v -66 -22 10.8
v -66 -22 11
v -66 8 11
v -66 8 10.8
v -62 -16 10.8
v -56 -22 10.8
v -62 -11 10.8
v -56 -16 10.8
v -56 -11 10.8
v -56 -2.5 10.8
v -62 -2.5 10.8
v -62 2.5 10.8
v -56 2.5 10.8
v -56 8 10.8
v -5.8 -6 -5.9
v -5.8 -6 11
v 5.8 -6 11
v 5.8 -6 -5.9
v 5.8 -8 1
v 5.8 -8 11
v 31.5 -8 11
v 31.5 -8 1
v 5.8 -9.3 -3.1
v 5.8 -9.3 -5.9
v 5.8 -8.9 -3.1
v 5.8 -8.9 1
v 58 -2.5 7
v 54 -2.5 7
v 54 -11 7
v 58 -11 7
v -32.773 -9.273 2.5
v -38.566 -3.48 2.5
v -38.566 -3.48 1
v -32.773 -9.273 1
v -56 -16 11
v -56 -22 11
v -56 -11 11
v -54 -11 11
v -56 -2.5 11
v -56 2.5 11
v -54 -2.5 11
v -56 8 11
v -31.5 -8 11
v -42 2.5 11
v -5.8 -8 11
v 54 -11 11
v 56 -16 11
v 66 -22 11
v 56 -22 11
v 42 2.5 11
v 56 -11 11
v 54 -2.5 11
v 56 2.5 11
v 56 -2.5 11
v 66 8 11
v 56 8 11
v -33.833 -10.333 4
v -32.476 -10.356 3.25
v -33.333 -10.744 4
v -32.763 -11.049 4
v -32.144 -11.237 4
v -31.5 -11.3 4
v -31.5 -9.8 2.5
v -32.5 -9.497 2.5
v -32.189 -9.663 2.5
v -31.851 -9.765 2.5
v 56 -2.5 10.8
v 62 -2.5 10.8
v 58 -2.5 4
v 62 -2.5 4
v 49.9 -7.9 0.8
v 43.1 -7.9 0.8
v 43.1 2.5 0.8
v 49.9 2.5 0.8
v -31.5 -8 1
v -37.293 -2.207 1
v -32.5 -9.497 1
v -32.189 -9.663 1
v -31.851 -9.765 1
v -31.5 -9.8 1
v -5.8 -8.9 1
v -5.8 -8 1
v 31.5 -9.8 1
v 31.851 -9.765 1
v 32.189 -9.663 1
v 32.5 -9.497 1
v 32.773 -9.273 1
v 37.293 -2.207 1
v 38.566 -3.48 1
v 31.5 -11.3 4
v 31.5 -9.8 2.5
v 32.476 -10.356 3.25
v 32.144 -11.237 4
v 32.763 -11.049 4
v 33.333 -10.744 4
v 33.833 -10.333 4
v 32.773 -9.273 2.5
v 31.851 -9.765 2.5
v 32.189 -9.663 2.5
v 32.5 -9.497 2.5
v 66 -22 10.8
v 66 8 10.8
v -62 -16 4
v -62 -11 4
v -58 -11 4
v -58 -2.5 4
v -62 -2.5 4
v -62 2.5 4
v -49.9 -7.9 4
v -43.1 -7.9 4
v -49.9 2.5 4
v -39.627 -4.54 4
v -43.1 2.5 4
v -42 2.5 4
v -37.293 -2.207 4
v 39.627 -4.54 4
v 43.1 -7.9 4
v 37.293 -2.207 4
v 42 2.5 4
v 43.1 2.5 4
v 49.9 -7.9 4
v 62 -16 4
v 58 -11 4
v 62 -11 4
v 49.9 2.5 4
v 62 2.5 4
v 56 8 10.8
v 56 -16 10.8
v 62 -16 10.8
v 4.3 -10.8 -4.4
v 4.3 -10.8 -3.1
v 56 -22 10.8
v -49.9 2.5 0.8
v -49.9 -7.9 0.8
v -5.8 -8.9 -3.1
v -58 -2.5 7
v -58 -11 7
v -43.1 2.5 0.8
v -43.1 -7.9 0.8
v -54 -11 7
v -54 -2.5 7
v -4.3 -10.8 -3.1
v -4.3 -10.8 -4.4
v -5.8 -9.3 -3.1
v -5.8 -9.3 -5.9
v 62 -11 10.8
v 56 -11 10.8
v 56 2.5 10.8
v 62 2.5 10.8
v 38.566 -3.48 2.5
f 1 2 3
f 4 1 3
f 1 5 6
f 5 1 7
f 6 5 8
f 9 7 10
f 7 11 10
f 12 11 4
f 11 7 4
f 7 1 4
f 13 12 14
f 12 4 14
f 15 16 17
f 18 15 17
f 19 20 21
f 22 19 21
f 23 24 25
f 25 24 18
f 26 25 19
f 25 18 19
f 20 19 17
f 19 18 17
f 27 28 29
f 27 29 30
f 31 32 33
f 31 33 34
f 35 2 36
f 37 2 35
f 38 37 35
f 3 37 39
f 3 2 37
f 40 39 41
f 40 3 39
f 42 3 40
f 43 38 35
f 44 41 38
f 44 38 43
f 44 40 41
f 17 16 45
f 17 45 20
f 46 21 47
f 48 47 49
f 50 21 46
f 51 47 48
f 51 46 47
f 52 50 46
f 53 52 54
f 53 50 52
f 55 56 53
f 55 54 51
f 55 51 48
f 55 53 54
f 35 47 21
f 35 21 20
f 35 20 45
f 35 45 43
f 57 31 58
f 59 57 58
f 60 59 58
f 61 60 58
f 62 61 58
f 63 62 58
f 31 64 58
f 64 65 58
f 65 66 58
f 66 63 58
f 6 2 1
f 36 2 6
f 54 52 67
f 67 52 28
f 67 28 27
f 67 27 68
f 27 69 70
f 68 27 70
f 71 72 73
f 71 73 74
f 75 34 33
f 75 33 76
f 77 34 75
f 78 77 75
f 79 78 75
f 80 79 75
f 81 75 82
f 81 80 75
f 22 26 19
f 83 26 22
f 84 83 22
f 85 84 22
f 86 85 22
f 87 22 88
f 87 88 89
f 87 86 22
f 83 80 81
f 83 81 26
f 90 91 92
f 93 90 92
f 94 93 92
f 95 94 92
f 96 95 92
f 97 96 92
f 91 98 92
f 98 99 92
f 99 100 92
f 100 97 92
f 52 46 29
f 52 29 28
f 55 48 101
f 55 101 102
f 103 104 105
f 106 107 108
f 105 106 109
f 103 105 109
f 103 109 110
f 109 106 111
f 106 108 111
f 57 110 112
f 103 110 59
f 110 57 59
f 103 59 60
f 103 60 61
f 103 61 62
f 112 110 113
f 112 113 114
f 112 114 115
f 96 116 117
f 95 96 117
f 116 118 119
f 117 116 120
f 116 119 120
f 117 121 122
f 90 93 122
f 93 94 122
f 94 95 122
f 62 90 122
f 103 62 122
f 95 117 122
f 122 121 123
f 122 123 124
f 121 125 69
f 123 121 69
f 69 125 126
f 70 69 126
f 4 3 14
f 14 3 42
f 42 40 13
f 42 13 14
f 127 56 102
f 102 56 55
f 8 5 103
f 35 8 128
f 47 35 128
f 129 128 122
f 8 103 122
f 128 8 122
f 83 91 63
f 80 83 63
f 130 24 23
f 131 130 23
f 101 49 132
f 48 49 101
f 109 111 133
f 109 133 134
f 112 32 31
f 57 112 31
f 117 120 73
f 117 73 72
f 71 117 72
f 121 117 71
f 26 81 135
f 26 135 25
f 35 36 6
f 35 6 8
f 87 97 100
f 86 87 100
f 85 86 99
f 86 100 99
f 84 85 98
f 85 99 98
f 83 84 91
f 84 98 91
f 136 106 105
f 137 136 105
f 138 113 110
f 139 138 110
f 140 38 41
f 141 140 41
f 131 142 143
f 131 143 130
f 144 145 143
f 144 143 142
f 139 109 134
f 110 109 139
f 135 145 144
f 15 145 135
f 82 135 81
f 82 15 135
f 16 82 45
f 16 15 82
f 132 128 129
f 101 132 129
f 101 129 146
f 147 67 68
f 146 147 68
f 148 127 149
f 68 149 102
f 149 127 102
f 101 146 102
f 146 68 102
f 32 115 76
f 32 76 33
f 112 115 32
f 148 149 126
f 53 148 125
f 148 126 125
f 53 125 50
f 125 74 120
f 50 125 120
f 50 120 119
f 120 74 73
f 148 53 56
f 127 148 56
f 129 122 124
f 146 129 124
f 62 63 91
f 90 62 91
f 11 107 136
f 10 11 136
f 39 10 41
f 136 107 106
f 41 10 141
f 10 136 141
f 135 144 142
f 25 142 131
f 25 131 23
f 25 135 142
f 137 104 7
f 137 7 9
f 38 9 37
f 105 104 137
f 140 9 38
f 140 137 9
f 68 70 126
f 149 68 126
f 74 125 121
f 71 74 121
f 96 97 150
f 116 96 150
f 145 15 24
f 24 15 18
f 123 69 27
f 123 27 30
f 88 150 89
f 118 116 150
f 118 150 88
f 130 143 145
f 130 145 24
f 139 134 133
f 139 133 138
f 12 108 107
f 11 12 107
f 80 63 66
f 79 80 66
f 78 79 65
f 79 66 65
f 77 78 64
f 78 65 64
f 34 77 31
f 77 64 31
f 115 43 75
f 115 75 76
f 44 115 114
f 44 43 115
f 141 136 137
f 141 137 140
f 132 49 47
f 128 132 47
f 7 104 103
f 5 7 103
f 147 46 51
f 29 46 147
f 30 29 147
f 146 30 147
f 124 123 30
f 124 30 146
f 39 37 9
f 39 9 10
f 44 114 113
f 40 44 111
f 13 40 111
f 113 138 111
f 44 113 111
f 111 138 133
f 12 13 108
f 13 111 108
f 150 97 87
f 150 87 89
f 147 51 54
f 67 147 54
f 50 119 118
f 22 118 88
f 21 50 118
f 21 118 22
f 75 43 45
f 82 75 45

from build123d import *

# Parameters (mm, degrees)
PAD002_DEPTH    = 7
PAD003_DEPTH    = 3
CHAMFER003_SIZE = 1.5
SKETCH019_W     = 4
SKETCH019_H     = 8.5
POCKET003_DEPTH = 7.001
SKETCH020_W     = 4
SKETCH020_H     = 8.5
POCKET004_DEPTH = 4
SKETCH024_W     = 11.6
SKETCH024_H     = 2.9
PAD006_DEPTH    = 16.9
SKETCH025_W     = 11.6
SKETCH025_H     = 2.8
PAD007_DEPTH    = 1.9
CHAMFER005_SIZE = 1.5
SKETCH026_W     = 6.8
SKETCH026_H     = 10.4
PAD008_DEPTH    = 3.2
SKETCH034_W     = 10
SKETCH034_H     = 30
PAD014_DEPTH    = 0.2


with BuildPart() as part:
    # Sketch006 → Pad002 (new body)
    with BuildSketch(Plane.XY.offset(4)):
        Polygon((-62, 2.5), (-62, -16), (62, -16), (62, 2.5), (42, 2.5), (31.5, -8), (-31.5, -8), (-42, 2.5), align=None)
    extrude(amount=PAD002_DEPTH)

    # Sketch007 (on Face9 of Pad002) → Pad003 (join)
    with BuildSketch(Plane(origin=(0, 0, 4), x_dir=(1, 0, 0), z_dir=(0, 0, -1))):
        with BuildLine():
            Line((-31.5, 8), (31.5, 8))
            Line((37.293259, 2.206741), (31.5, 8))
            Line((38.566051, 3.479533), (37.293259, 2.206741))
            Line((32.772792, 9.272792), (38.566051, 3.479533))
            ThreePointArc((32.772792, 9.272792), (32.18883, 9.662983), (31.5, 9.8))
            Line((31.5, 9.8), (-31.5, 9.8))
            ThreePointArc((-31.5, 9.8), (-32.18883, 9.662983), (-32.772792, 9.272792))
            Line((-38.566051, 3.479533), (-32.772792, 9.272792))
            Line((-37.293259, 2.206741), (-38.566051, 3.479533))
            Line((-31.5, 8), (-37.293259, 2.206741))
        make_face()
    extrude(amount=PAD003_DEPTH)

    # Chamfer003
    chamfer003_edges = [part.edges().sort_by_distance(p)[0] for p in [
        (-35.669422, -6.376163, 4),
    ]]
    chamfer(chamfer003_edges, length=CHAMFER003_SIZE)

    # Sketch019 (on Face1 of Chamfer003) → Pocket003 (cut, through all)
    with BuildSketch(Plane(origin=(0, 0, 4), x_dir=(1, 0, 0), z_dir=(0, 0, -1))):
        with Locations((-60, 6.75)):
            Rectangle(SKETCH019_W, SKETCH019_H)
        with Locations((60, 6.75)):
            Rectangle(SKETCH019_W, SKETCH019_H)
    extrude(amount=-POCKET003_DEPTH, mode=Mode.SUBTRACT)

    # Sketch020 (on Face31 of Pocket003) → Pocket004 (cut)
    with BuildSketch(Plane.XY.offset(11)):
        with Locations((-56, -6.75)):
            Rectangle(SKETCH020_W, SKETCH020_H)
        with Locations((56, -6.75)):
            Rectangle(SKETCH020_W, SKETCH020_H)
    extrude(amount=-POCKET004_DEPTH, mode=Mode.SUBTRACT)

    # Sketch024 (on Face27 of Pocket004) → Pad006 (join)
    with BuildSketch(Plane.XY.offset(11)):
        with Locations((0, -7.45)):
            Rectangle(SKETCH024_W, SKETCH024_H)
    extrude(amount=-PAD006_DEPTH)

    # Sketch025 (on Face37 of Pad006) → Pad007 (join)
    with BuildSketch(Plane.XZ.offset(8.9)):
        with Locations((0, -4.5)):
            Rectangle(SKETCH025_W, SKETCH025_H)
    extrude(amount=PAD007_DEPTH)

    # Chamfer005
    chamfer005_edges = [part.edges().sort_by_distance(p)[0] for p in [
        (0, -10.8, -5.9),
        (-5.8, -10.8, -4.5),
        (5.8, -10.8, -4.5),
    ]]
    chamfer(chamfer005_edges, length=CHAMFER005_SIZE)

    # Sketch026 (on Face37 of Chamfer005) → Pad008 (join)
    with BuildSketch(Plane(origin=(0, 0, 4), x_dir=(1, 0, 0), z_dir=(0, 0, -1))):
        with Locations((-46.5, 2.7)):
            Rectangle(SKETCH026_W, SKETCH026_H)
        with Locations((46.5, 2.7)):
            Rectangle(SKETCH026_W, SKETCH026_H)
    extrude(amount=PAD008_DEPTH)

    # Sketch034 (on Face12 of Pad008) → Pad014 (join)
    with BuildSketch(Plane.XY.offset(11)):
        with Locations((-61, -7)):
            Rectangle(SKETCH034_W, SKETCH034_H)
        with Locations((61, -7)):
            Rectangle(SKETCH034_W, SKETCH034_H)
    extrude(amount=-PAD014_DEPTH)


solid = part.part
